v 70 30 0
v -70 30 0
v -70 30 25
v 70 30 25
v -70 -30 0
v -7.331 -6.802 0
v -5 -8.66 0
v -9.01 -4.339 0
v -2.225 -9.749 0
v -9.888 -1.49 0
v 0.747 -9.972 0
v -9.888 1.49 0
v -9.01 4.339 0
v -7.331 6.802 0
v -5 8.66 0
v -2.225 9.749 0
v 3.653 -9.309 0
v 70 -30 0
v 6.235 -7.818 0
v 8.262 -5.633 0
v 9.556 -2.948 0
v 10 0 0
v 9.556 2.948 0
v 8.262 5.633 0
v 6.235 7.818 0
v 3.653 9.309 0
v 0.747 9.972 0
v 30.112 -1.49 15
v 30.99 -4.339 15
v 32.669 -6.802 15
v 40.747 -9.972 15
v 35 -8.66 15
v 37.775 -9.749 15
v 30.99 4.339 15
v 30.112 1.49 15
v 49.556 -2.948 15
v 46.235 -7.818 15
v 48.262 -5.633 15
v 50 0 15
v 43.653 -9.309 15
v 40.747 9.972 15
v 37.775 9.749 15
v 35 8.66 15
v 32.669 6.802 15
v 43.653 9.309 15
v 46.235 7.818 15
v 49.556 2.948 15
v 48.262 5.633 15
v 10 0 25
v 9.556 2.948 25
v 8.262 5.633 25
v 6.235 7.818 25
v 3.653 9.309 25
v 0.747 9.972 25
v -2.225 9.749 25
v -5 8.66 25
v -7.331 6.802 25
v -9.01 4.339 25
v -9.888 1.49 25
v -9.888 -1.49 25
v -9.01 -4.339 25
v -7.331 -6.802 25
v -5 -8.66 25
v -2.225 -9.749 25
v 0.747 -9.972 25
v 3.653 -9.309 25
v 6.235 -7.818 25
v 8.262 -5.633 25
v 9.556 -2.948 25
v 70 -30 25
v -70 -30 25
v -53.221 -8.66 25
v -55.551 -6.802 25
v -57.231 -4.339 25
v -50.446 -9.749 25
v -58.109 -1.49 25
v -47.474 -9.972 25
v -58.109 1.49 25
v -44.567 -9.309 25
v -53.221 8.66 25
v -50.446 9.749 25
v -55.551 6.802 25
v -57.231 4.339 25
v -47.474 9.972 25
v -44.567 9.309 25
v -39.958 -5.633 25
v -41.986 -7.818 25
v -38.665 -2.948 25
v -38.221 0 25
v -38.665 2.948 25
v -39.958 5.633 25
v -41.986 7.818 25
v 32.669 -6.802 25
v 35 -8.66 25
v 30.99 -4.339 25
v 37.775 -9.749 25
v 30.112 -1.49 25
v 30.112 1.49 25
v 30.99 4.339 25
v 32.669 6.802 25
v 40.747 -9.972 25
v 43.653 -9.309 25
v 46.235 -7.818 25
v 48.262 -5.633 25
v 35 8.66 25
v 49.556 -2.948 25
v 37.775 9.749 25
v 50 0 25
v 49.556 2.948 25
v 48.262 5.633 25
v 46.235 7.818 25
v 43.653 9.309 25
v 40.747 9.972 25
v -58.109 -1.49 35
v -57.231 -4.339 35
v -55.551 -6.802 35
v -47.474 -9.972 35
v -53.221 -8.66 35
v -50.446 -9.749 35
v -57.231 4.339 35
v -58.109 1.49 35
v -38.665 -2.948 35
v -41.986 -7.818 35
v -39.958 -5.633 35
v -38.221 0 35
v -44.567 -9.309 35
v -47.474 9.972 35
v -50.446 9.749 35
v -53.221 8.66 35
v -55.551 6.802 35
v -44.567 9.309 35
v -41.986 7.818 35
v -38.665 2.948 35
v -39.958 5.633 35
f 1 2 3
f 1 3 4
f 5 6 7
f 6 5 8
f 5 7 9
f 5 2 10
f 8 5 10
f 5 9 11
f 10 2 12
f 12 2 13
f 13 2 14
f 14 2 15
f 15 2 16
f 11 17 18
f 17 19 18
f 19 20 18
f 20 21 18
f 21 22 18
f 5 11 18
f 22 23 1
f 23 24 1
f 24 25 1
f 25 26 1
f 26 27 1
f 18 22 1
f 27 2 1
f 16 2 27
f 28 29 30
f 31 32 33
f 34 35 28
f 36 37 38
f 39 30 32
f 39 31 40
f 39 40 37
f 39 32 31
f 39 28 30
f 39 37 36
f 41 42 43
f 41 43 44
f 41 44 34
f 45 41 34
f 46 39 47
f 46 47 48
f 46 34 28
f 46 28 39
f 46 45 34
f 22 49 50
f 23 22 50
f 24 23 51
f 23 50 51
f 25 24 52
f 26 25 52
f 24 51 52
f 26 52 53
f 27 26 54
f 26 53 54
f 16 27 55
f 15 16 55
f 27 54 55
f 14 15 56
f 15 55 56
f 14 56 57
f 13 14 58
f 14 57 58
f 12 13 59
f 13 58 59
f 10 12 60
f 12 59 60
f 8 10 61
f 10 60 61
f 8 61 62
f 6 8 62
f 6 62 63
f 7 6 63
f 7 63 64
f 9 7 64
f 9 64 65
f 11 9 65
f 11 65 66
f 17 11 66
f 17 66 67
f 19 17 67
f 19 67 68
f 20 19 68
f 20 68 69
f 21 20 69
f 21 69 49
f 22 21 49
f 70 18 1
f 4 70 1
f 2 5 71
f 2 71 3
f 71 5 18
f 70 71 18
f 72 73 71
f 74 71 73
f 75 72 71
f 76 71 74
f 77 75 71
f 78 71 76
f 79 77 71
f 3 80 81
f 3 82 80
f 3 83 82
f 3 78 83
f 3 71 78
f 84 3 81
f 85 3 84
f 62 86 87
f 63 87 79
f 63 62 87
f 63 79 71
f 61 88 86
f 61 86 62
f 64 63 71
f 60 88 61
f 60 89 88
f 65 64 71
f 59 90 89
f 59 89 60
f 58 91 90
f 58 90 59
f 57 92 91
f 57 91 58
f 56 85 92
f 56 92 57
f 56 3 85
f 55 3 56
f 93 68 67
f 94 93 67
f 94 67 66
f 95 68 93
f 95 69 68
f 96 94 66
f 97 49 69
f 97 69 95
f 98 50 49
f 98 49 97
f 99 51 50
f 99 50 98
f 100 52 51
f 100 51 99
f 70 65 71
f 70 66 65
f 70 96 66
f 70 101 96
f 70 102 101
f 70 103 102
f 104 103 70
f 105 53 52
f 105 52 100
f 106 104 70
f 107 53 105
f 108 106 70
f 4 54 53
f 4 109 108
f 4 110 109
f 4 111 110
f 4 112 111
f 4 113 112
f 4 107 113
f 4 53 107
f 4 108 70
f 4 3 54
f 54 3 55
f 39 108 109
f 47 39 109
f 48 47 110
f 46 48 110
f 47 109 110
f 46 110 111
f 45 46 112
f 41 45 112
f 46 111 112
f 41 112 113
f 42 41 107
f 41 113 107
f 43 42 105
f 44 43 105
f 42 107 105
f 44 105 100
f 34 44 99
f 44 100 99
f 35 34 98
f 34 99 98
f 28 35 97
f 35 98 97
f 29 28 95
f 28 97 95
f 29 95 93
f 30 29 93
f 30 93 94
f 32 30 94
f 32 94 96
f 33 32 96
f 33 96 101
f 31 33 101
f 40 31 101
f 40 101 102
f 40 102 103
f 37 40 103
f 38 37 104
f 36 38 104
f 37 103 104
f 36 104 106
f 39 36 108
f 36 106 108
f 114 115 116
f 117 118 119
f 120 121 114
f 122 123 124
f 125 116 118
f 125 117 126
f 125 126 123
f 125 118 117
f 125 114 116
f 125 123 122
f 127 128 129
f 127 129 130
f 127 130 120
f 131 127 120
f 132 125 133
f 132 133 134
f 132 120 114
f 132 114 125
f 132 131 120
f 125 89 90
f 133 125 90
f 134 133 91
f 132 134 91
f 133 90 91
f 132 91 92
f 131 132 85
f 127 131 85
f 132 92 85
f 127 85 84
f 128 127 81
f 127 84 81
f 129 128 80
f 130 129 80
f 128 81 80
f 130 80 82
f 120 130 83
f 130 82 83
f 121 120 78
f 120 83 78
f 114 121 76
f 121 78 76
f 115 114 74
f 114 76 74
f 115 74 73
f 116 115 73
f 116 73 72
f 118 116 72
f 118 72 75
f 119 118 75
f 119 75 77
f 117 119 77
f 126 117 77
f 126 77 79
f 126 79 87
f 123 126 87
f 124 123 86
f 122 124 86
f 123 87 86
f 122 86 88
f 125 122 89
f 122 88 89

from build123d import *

# Parameters (mm, degrees)
F0_W     = 140
F0_H     = 60
F1_DEPTH = 25
F2_R     = 10
F5_DEPTH = 10
F4_R     = 10
F6_DEPTH = 41.8
F3_R     = 10
F7_DEPTH = 10


with BuildPart() as f1:
    # F0 (on Top) → F1 (new body)
    with BuildSketch(Plane.XY):
        Rectangle(F0_W, F0_H)
    extrude(amount=F1_DEPTH)

    # F2 (on face) → F5 (join)
    with BuildSketch(Plane.XY.offset(25)):
        with Locations((-48.220878, 0)):
            Circle(F2_R)
    extrude(amount=F5_DEPTH)

    # F4 (on face) → F6 (cut)
    with BuildSketch(Plane.XY.offset(25)):
        Circle(F4_R)
    extrude(amount=-F6_DEPTH, mode=Mode.SUBTRACT)

    # F3 (on face) → F7 (cut)
    with BuildSketch(Plane.XY.offset(25)):
        with Locations((40, 0)):
            Circle(F3_R)
    extrude(amount=-F7_DEPTH, mode=Mode.SUBTRACT)


solid = f1.part
